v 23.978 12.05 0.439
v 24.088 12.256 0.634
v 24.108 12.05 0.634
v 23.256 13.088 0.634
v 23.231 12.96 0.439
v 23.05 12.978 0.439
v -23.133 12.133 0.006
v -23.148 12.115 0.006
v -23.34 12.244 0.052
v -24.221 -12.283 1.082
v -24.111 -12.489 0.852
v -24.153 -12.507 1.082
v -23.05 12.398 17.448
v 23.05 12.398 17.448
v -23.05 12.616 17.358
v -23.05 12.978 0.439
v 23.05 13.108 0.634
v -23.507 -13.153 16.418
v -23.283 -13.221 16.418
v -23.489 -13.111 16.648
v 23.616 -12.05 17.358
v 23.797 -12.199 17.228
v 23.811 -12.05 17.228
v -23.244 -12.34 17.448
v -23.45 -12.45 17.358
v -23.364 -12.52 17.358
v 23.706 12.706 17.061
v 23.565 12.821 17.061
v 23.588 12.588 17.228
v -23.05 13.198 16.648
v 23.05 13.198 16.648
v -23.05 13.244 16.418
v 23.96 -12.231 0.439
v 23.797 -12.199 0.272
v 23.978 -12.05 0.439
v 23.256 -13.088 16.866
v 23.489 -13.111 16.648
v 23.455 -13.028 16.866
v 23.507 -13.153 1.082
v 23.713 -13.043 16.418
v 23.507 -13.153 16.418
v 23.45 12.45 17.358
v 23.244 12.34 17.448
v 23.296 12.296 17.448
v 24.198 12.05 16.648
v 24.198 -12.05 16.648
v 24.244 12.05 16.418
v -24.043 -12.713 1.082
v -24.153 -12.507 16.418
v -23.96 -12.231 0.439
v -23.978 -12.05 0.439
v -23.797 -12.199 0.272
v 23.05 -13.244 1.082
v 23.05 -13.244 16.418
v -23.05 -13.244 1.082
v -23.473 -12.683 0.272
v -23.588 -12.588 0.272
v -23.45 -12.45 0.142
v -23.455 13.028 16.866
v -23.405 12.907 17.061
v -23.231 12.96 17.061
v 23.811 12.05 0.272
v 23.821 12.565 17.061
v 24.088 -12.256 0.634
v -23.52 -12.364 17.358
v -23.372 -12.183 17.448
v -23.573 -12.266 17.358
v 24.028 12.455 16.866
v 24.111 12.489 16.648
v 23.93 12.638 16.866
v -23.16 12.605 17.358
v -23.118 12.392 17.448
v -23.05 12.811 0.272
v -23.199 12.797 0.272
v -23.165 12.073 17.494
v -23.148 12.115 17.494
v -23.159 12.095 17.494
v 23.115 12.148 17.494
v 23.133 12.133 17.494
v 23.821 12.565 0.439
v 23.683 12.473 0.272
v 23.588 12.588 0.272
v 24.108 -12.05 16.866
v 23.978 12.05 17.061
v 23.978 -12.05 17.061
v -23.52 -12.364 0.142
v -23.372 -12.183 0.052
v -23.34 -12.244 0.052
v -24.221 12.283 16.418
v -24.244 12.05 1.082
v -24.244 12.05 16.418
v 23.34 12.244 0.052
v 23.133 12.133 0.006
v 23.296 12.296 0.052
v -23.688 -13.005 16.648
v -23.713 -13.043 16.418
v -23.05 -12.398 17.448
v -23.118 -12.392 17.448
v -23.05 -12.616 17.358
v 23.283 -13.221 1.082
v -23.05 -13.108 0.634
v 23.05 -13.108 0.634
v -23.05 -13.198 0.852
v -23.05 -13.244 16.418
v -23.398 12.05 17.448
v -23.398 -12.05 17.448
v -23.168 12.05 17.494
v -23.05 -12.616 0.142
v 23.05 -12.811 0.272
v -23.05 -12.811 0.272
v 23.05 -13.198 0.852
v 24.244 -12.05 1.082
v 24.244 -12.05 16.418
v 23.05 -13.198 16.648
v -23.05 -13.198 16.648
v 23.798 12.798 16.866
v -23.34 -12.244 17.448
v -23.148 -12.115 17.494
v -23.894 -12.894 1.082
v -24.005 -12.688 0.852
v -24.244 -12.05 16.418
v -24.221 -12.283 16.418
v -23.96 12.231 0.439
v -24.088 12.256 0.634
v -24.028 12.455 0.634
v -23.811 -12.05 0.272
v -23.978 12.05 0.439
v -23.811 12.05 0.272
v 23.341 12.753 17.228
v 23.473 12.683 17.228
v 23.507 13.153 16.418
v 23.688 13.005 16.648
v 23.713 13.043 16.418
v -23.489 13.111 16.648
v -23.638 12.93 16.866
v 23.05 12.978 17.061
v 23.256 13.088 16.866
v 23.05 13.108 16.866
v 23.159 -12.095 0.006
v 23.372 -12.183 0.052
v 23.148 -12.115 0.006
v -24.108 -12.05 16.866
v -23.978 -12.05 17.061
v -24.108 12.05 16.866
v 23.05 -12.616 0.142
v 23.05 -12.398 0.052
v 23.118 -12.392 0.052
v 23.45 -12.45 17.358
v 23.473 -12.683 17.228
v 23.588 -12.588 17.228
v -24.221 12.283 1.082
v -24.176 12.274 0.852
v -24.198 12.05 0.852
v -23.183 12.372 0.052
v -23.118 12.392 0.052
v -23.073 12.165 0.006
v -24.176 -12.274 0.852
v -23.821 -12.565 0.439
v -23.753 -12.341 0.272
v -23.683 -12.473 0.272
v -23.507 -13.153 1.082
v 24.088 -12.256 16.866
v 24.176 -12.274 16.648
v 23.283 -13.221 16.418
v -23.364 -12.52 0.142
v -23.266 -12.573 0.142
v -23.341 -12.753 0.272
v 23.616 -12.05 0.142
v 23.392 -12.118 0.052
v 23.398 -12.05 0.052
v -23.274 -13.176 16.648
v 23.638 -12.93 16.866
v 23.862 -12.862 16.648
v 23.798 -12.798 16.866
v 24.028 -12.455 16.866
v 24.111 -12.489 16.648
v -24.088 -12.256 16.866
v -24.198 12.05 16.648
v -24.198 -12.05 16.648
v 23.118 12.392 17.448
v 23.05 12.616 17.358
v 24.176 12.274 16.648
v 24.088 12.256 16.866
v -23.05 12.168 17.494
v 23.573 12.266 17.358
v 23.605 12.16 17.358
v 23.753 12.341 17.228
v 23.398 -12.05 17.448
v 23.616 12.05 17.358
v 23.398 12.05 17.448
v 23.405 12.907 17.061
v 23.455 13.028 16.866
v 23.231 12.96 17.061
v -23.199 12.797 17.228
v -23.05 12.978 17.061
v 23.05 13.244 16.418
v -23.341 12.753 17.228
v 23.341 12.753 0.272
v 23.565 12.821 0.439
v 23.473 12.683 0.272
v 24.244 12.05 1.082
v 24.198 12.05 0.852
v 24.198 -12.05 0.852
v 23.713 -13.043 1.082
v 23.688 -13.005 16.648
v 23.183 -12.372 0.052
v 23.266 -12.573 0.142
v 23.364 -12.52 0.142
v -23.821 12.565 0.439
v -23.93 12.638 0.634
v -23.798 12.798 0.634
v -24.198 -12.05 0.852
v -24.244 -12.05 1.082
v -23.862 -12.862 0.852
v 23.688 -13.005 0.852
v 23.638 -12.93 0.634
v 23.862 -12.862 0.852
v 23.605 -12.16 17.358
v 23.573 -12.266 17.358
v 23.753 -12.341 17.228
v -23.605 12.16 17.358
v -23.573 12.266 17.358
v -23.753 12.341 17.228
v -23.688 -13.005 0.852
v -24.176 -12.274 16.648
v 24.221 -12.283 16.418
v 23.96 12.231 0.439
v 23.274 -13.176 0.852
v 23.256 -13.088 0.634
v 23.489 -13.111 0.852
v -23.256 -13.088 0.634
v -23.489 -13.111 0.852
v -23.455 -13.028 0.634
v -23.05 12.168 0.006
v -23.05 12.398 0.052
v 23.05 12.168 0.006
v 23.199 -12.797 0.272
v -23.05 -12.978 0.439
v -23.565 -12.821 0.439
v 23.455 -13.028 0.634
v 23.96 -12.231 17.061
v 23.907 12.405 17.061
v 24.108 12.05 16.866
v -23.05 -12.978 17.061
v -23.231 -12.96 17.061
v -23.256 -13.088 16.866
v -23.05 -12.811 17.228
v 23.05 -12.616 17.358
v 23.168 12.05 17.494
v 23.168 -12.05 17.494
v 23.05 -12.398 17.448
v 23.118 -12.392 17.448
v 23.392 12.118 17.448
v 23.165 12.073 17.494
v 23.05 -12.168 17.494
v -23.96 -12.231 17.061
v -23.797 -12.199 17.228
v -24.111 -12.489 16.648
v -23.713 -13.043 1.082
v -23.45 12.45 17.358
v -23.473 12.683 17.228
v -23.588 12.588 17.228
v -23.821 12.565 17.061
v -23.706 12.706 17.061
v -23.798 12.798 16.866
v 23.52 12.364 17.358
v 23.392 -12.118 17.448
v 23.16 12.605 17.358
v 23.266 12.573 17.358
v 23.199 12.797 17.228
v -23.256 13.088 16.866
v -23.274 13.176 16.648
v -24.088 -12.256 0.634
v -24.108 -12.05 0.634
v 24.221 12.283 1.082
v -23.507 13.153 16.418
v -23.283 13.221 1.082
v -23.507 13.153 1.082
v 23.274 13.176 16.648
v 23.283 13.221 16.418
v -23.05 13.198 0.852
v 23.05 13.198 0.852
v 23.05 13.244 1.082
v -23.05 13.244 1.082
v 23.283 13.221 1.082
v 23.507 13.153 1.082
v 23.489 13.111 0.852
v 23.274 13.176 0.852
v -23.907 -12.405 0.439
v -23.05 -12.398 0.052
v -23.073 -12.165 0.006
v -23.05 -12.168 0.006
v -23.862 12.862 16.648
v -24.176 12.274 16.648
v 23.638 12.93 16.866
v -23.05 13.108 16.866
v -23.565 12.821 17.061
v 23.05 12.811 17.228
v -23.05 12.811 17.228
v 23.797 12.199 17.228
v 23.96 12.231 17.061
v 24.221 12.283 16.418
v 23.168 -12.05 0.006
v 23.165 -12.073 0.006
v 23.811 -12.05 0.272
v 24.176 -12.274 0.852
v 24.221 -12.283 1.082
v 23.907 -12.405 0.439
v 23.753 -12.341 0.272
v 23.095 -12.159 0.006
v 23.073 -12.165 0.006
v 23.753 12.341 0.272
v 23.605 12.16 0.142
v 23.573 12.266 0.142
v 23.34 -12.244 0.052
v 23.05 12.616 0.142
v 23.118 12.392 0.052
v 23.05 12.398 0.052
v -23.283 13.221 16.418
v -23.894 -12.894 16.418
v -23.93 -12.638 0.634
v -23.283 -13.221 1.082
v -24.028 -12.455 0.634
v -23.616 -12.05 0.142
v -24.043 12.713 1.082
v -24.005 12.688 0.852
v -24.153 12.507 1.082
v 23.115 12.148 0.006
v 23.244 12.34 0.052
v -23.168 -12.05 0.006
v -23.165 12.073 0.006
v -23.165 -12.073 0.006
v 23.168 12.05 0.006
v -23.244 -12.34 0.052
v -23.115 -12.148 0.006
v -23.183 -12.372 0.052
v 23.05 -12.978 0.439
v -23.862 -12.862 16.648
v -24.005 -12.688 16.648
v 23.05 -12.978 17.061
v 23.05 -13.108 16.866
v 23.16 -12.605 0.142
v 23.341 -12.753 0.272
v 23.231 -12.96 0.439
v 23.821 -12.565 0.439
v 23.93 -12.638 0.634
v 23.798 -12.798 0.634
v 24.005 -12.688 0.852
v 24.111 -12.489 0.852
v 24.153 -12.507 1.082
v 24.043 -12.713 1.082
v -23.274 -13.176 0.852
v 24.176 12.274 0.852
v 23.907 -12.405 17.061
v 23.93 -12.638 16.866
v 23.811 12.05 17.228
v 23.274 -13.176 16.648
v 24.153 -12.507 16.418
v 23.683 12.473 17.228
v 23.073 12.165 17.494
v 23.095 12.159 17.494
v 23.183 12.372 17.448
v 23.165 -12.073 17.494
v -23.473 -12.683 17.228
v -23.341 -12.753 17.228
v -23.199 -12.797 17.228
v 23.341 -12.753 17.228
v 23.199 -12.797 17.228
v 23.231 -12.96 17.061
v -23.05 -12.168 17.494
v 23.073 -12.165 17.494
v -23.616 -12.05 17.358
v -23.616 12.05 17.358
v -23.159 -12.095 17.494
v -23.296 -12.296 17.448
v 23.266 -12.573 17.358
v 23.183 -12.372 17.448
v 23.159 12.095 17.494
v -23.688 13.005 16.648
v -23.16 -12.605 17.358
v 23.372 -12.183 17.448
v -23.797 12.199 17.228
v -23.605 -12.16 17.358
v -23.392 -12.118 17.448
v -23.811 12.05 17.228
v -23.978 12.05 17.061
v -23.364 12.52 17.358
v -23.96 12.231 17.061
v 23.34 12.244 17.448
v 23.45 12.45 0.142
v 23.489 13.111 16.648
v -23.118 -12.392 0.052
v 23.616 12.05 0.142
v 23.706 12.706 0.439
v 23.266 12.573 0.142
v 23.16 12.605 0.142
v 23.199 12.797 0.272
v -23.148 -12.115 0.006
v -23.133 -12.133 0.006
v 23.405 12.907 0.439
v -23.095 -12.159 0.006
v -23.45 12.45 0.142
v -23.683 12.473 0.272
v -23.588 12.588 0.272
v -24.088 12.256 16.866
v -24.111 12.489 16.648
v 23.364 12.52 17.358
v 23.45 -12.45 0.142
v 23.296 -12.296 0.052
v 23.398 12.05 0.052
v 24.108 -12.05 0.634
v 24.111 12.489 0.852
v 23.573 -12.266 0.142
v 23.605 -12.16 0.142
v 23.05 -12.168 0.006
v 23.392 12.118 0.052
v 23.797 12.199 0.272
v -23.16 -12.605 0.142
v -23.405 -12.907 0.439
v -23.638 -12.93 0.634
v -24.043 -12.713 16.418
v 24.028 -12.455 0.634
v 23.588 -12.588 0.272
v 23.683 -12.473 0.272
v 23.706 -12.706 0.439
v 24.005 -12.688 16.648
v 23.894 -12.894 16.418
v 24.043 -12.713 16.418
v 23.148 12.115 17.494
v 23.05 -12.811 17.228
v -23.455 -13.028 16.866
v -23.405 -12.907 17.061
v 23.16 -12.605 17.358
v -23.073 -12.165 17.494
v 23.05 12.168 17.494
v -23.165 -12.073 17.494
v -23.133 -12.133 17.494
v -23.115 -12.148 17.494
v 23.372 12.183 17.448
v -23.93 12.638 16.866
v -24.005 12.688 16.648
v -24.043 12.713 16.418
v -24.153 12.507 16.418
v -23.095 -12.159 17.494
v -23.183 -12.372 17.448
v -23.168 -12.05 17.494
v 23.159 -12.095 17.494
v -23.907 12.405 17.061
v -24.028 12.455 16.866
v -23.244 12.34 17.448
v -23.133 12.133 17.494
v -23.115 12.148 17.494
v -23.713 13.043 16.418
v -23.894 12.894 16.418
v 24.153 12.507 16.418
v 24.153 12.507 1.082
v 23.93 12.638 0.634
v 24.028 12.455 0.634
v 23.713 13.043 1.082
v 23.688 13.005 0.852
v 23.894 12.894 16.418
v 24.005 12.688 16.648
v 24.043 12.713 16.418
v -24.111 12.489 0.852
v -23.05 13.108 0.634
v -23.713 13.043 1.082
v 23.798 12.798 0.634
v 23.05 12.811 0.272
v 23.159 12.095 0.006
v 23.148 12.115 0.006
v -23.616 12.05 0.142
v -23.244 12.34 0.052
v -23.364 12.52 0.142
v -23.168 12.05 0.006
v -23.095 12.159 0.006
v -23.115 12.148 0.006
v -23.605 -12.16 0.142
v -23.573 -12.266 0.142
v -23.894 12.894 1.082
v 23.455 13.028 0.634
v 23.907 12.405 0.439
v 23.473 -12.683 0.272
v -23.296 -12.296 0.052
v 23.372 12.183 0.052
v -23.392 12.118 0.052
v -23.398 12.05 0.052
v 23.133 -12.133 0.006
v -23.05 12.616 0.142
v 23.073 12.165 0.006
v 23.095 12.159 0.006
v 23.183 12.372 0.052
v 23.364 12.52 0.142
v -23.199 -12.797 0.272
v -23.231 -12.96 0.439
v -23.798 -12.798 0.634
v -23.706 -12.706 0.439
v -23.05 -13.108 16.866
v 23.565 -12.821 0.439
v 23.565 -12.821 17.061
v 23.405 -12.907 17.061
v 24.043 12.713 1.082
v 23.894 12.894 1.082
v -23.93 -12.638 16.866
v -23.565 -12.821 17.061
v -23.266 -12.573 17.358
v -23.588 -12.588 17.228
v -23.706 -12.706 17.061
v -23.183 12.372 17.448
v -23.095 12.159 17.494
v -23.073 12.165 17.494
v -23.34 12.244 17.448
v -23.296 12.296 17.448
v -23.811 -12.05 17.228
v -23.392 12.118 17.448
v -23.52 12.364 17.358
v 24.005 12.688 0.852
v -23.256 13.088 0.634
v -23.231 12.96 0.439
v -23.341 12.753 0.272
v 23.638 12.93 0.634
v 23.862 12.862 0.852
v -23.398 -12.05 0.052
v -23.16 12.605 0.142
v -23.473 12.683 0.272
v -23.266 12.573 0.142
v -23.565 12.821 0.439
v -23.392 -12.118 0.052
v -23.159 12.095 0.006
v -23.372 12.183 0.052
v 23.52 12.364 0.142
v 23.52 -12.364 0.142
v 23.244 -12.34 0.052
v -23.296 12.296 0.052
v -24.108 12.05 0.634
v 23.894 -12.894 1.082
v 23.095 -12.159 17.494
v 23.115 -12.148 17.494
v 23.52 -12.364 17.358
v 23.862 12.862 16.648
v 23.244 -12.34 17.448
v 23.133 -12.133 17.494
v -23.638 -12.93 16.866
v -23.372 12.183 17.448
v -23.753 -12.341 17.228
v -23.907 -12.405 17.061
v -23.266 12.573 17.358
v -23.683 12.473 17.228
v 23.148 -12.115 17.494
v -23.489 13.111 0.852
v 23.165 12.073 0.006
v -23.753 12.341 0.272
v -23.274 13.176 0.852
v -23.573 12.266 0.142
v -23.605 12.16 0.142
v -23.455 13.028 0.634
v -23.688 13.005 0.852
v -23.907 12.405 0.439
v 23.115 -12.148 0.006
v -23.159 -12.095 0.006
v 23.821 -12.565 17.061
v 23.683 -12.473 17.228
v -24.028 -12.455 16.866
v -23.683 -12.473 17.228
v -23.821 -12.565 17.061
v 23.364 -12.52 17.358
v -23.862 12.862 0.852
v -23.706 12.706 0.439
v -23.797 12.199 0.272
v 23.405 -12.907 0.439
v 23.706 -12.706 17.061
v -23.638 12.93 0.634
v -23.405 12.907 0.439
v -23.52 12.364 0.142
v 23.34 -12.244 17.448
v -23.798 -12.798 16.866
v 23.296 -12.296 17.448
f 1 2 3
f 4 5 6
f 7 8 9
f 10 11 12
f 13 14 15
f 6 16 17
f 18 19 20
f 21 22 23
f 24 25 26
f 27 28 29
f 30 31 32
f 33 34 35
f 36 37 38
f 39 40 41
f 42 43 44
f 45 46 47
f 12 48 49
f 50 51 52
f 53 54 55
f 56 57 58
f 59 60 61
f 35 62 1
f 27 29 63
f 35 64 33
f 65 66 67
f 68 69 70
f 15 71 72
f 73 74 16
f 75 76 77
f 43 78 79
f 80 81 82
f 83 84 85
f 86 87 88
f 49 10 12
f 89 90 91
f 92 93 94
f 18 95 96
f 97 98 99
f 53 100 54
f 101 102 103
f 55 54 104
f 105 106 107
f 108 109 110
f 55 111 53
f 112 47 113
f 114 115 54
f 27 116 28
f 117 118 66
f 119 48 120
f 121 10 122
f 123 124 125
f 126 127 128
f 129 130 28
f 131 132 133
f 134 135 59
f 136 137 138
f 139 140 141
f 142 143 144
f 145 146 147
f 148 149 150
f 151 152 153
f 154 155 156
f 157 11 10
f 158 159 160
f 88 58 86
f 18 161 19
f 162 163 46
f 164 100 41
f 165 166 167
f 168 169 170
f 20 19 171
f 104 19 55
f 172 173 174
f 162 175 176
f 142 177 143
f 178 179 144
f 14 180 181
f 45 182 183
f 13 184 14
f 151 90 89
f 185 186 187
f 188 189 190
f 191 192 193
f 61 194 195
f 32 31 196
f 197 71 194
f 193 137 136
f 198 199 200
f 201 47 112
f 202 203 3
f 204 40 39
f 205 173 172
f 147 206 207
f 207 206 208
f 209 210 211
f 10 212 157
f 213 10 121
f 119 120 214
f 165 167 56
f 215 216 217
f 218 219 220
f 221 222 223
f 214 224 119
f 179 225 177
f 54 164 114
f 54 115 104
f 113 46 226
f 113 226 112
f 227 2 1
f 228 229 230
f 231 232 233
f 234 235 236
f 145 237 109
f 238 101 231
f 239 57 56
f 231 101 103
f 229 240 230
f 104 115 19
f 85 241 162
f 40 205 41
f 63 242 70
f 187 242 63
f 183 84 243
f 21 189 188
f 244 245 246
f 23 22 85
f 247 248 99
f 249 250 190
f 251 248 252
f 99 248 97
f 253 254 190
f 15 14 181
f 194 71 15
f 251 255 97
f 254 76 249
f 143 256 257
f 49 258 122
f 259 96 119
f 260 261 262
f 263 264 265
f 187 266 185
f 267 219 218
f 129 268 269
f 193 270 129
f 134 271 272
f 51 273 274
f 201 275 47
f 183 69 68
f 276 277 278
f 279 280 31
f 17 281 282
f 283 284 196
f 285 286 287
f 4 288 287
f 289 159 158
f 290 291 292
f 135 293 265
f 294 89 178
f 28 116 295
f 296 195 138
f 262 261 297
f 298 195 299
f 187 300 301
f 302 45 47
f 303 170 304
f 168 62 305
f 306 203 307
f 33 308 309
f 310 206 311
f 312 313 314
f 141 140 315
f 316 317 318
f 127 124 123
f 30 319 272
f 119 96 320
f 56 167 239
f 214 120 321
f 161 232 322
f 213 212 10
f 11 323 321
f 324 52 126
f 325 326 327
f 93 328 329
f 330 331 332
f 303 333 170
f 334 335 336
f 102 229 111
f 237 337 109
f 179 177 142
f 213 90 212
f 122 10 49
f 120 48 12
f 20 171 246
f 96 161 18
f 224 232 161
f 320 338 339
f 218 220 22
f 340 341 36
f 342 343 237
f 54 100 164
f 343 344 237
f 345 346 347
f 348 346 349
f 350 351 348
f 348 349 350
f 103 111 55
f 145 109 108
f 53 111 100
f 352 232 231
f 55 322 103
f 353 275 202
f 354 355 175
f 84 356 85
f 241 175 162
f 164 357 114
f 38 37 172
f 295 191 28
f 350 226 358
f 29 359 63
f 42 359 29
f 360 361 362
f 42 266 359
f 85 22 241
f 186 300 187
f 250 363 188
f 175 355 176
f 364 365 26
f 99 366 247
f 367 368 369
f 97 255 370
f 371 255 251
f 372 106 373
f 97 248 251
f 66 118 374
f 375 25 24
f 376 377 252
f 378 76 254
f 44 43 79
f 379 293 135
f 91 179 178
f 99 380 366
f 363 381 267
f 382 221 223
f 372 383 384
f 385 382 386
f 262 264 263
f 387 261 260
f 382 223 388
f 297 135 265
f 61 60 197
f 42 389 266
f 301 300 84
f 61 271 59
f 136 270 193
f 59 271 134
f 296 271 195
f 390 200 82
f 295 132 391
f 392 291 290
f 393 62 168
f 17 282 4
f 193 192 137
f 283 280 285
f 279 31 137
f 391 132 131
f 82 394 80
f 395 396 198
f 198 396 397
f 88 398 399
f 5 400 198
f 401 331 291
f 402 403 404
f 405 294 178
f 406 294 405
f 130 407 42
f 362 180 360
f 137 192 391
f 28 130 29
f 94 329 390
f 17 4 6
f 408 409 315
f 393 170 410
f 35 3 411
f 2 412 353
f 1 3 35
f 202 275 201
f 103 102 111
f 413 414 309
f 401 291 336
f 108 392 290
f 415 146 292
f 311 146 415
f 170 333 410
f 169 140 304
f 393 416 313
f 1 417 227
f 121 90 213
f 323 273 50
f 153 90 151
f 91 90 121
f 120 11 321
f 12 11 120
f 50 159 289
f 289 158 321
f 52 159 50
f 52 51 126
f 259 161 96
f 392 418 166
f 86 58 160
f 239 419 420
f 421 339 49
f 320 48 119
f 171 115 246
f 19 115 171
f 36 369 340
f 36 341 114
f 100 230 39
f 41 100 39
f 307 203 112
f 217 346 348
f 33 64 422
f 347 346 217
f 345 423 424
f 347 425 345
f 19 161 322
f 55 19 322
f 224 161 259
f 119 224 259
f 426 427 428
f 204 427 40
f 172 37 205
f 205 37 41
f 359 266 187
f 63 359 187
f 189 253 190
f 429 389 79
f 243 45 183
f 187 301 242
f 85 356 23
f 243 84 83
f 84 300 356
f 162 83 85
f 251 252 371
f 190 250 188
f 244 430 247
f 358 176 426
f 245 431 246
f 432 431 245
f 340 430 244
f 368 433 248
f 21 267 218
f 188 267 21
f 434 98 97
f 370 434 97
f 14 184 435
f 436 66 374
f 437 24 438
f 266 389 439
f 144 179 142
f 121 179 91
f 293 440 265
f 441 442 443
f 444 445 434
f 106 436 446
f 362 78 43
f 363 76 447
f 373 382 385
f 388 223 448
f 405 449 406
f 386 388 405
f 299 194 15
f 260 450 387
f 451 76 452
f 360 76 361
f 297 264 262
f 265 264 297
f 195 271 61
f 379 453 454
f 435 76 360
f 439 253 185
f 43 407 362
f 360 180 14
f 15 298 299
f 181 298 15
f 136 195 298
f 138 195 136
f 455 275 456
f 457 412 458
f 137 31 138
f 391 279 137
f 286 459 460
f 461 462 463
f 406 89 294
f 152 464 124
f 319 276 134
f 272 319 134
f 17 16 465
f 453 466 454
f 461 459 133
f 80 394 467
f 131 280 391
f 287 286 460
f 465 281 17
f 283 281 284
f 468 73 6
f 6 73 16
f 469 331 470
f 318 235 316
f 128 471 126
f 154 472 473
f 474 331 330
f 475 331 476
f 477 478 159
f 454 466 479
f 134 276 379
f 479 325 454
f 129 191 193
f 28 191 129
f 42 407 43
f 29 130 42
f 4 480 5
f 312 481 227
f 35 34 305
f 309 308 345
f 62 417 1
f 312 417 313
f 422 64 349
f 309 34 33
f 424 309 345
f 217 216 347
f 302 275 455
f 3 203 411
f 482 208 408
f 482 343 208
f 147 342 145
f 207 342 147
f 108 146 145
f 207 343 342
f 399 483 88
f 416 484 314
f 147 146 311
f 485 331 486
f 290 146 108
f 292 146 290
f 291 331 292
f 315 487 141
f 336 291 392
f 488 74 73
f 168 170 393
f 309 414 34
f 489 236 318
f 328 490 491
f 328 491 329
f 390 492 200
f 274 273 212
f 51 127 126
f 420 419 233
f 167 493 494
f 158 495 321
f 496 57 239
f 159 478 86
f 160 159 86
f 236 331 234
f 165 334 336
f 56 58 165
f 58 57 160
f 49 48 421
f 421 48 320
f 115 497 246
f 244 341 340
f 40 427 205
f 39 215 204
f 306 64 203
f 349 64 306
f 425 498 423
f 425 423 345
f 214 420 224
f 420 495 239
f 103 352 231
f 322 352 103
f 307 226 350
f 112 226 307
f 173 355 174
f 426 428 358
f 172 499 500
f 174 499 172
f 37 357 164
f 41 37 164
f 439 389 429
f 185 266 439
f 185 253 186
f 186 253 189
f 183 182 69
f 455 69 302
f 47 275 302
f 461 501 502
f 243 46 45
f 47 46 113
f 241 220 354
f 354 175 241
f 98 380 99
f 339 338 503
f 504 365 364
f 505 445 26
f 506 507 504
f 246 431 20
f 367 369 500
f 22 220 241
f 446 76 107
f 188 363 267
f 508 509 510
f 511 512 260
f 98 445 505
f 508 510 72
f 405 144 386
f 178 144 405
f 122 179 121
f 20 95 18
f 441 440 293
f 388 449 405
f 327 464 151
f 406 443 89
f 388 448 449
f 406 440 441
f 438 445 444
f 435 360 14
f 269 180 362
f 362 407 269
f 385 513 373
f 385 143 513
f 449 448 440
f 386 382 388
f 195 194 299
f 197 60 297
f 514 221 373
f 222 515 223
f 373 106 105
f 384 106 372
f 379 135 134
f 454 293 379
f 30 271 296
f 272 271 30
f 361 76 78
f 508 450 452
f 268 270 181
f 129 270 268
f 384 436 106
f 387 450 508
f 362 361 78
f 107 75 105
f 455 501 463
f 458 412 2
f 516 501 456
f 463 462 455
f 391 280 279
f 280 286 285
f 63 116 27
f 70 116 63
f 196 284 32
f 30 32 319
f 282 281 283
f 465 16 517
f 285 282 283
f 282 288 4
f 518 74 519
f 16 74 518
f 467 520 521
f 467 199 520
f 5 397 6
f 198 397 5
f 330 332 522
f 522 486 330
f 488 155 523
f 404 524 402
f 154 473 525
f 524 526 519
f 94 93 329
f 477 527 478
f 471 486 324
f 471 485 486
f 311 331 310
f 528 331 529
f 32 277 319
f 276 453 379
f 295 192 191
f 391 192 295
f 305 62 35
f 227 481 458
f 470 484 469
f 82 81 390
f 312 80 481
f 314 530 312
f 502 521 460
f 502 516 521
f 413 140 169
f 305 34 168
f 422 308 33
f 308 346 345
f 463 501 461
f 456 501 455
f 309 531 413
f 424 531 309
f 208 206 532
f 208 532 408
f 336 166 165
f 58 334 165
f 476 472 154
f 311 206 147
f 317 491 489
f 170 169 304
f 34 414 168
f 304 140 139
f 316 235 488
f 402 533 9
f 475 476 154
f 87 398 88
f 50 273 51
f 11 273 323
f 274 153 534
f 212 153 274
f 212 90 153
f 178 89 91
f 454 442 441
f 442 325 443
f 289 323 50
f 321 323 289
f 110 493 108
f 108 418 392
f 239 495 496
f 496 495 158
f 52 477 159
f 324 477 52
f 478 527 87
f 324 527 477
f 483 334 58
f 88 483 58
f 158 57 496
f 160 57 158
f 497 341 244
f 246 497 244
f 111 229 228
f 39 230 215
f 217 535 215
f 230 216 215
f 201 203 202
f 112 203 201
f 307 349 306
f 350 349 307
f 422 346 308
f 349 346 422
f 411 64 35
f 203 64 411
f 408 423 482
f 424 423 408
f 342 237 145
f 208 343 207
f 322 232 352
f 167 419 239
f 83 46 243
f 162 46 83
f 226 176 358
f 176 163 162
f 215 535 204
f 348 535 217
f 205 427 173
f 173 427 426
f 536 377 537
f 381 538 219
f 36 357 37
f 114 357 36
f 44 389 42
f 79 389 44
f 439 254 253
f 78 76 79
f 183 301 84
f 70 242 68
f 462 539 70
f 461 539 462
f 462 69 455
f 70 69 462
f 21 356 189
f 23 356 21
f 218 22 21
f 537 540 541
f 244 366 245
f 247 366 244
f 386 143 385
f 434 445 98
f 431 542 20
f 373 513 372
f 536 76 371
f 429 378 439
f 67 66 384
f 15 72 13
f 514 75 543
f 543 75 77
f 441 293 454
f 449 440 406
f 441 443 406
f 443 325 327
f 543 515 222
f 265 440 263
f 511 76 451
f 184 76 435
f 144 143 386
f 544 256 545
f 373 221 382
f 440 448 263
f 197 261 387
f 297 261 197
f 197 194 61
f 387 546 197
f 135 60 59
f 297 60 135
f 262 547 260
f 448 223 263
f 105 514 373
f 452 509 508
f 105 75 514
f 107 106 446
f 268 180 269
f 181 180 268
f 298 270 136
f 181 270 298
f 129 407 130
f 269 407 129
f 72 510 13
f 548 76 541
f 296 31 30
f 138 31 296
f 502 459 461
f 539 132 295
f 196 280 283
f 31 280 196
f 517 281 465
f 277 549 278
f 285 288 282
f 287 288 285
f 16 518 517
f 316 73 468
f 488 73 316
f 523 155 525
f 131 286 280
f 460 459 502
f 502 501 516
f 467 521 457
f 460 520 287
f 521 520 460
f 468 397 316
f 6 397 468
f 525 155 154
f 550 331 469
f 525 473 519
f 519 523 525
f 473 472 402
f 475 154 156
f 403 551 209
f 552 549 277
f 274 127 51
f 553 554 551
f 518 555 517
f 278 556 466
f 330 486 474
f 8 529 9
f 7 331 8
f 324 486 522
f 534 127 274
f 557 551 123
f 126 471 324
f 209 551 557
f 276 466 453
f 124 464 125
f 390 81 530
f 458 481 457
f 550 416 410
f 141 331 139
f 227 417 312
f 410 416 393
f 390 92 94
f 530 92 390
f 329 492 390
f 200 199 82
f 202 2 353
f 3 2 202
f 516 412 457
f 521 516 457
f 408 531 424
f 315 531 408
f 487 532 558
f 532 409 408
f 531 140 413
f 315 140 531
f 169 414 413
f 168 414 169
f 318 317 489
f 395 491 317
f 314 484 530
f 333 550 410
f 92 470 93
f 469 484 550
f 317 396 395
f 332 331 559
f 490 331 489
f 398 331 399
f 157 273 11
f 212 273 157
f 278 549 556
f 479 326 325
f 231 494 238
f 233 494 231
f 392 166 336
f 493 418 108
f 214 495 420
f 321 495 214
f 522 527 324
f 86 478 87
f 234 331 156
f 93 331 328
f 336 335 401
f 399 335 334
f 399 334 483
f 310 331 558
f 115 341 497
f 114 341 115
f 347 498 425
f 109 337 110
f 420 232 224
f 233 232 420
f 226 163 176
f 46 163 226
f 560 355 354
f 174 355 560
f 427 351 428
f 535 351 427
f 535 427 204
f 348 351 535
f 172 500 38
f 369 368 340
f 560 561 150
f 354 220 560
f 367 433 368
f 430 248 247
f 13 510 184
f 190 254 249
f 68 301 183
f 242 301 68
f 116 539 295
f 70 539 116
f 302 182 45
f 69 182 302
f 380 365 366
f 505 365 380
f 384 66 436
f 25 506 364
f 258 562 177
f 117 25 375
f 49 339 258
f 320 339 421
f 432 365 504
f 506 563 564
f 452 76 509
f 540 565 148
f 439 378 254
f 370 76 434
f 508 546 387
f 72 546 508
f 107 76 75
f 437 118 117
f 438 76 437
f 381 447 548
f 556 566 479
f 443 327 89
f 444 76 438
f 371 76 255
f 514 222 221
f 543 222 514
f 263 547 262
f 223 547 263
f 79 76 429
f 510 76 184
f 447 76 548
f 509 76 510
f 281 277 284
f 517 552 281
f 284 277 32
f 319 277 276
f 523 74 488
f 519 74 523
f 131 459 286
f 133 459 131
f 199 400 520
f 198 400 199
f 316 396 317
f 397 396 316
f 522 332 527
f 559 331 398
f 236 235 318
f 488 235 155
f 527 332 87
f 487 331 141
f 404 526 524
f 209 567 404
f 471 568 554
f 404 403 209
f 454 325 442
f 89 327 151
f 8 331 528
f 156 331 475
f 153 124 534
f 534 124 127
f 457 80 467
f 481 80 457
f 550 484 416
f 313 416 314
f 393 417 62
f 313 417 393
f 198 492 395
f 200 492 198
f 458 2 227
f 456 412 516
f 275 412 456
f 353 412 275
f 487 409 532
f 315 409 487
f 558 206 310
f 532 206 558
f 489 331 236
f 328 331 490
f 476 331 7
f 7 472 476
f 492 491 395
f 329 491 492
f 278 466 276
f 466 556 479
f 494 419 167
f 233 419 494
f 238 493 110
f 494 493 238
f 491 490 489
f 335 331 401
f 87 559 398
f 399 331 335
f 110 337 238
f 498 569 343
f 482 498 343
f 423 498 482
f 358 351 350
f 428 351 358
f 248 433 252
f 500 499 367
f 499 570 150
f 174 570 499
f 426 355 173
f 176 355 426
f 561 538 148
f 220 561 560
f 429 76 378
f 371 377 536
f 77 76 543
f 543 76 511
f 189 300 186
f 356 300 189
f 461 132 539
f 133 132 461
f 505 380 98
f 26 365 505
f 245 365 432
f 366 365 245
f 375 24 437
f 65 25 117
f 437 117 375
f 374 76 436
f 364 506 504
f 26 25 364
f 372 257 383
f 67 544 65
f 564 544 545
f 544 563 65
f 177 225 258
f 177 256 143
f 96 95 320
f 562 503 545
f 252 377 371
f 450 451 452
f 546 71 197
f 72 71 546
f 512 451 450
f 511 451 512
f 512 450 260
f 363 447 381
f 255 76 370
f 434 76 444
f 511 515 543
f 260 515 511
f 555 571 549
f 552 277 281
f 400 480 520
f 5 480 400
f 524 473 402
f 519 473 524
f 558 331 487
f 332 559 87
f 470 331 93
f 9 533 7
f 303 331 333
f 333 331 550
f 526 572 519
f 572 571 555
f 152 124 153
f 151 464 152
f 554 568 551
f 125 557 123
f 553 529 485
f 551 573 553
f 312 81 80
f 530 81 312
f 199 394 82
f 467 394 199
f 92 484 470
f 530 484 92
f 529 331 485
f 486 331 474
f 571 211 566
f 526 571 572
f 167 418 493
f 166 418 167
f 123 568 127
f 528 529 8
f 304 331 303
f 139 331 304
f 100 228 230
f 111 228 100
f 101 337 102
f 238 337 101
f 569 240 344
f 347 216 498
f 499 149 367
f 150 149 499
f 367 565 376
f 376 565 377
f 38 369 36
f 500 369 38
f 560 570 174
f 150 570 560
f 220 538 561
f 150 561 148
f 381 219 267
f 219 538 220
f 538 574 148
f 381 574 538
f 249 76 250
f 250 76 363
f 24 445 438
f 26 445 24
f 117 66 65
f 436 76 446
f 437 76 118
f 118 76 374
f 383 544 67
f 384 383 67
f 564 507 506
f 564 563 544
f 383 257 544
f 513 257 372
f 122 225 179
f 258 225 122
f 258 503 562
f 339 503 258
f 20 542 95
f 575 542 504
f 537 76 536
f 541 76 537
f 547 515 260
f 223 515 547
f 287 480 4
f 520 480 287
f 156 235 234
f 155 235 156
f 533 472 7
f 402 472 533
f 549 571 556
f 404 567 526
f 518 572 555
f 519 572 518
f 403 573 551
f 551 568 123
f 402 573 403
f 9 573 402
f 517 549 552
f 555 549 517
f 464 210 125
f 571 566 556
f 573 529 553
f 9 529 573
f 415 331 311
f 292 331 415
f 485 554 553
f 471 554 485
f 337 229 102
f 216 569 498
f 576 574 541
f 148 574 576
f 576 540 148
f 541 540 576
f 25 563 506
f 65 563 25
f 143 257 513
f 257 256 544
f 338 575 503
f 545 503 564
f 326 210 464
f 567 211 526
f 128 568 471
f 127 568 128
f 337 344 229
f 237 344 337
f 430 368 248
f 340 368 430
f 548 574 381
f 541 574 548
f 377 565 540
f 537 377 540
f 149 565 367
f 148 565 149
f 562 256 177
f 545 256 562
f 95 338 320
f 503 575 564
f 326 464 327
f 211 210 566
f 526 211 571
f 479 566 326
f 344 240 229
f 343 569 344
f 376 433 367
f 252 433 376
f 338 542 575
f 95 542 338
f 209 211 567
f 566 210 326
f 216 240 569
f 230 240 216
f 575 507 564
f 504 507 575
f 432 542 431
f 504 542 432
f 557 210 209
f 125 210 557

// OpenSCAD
// 9V Battery (9V 電池) visual source for NexCAD.
// Units: millimeters. Origin: part bottom-center, matching src/parts/library.ts.
// This generated baseline is intentionally simple; refine it with measured details before exporting STL.

$fn = 32;

module rounded_box(size, r = 0.8) {
  hull() {
    for (x = [-size[0] / 2 + r, size[0] / 2 - r])
      for (y = [-size[1] / 2 + r, size[1] / 2 - r]) {
        translate([x, y, r]) sphere(r = r);
        translate([x, y, size[2] - r]) sphere(r = r);
      }
  }
}

color("#2e7d5b") rounded_box([48.5, 26.5, 17.5], min(1.2, min(48.5, 26.5) / 8));
